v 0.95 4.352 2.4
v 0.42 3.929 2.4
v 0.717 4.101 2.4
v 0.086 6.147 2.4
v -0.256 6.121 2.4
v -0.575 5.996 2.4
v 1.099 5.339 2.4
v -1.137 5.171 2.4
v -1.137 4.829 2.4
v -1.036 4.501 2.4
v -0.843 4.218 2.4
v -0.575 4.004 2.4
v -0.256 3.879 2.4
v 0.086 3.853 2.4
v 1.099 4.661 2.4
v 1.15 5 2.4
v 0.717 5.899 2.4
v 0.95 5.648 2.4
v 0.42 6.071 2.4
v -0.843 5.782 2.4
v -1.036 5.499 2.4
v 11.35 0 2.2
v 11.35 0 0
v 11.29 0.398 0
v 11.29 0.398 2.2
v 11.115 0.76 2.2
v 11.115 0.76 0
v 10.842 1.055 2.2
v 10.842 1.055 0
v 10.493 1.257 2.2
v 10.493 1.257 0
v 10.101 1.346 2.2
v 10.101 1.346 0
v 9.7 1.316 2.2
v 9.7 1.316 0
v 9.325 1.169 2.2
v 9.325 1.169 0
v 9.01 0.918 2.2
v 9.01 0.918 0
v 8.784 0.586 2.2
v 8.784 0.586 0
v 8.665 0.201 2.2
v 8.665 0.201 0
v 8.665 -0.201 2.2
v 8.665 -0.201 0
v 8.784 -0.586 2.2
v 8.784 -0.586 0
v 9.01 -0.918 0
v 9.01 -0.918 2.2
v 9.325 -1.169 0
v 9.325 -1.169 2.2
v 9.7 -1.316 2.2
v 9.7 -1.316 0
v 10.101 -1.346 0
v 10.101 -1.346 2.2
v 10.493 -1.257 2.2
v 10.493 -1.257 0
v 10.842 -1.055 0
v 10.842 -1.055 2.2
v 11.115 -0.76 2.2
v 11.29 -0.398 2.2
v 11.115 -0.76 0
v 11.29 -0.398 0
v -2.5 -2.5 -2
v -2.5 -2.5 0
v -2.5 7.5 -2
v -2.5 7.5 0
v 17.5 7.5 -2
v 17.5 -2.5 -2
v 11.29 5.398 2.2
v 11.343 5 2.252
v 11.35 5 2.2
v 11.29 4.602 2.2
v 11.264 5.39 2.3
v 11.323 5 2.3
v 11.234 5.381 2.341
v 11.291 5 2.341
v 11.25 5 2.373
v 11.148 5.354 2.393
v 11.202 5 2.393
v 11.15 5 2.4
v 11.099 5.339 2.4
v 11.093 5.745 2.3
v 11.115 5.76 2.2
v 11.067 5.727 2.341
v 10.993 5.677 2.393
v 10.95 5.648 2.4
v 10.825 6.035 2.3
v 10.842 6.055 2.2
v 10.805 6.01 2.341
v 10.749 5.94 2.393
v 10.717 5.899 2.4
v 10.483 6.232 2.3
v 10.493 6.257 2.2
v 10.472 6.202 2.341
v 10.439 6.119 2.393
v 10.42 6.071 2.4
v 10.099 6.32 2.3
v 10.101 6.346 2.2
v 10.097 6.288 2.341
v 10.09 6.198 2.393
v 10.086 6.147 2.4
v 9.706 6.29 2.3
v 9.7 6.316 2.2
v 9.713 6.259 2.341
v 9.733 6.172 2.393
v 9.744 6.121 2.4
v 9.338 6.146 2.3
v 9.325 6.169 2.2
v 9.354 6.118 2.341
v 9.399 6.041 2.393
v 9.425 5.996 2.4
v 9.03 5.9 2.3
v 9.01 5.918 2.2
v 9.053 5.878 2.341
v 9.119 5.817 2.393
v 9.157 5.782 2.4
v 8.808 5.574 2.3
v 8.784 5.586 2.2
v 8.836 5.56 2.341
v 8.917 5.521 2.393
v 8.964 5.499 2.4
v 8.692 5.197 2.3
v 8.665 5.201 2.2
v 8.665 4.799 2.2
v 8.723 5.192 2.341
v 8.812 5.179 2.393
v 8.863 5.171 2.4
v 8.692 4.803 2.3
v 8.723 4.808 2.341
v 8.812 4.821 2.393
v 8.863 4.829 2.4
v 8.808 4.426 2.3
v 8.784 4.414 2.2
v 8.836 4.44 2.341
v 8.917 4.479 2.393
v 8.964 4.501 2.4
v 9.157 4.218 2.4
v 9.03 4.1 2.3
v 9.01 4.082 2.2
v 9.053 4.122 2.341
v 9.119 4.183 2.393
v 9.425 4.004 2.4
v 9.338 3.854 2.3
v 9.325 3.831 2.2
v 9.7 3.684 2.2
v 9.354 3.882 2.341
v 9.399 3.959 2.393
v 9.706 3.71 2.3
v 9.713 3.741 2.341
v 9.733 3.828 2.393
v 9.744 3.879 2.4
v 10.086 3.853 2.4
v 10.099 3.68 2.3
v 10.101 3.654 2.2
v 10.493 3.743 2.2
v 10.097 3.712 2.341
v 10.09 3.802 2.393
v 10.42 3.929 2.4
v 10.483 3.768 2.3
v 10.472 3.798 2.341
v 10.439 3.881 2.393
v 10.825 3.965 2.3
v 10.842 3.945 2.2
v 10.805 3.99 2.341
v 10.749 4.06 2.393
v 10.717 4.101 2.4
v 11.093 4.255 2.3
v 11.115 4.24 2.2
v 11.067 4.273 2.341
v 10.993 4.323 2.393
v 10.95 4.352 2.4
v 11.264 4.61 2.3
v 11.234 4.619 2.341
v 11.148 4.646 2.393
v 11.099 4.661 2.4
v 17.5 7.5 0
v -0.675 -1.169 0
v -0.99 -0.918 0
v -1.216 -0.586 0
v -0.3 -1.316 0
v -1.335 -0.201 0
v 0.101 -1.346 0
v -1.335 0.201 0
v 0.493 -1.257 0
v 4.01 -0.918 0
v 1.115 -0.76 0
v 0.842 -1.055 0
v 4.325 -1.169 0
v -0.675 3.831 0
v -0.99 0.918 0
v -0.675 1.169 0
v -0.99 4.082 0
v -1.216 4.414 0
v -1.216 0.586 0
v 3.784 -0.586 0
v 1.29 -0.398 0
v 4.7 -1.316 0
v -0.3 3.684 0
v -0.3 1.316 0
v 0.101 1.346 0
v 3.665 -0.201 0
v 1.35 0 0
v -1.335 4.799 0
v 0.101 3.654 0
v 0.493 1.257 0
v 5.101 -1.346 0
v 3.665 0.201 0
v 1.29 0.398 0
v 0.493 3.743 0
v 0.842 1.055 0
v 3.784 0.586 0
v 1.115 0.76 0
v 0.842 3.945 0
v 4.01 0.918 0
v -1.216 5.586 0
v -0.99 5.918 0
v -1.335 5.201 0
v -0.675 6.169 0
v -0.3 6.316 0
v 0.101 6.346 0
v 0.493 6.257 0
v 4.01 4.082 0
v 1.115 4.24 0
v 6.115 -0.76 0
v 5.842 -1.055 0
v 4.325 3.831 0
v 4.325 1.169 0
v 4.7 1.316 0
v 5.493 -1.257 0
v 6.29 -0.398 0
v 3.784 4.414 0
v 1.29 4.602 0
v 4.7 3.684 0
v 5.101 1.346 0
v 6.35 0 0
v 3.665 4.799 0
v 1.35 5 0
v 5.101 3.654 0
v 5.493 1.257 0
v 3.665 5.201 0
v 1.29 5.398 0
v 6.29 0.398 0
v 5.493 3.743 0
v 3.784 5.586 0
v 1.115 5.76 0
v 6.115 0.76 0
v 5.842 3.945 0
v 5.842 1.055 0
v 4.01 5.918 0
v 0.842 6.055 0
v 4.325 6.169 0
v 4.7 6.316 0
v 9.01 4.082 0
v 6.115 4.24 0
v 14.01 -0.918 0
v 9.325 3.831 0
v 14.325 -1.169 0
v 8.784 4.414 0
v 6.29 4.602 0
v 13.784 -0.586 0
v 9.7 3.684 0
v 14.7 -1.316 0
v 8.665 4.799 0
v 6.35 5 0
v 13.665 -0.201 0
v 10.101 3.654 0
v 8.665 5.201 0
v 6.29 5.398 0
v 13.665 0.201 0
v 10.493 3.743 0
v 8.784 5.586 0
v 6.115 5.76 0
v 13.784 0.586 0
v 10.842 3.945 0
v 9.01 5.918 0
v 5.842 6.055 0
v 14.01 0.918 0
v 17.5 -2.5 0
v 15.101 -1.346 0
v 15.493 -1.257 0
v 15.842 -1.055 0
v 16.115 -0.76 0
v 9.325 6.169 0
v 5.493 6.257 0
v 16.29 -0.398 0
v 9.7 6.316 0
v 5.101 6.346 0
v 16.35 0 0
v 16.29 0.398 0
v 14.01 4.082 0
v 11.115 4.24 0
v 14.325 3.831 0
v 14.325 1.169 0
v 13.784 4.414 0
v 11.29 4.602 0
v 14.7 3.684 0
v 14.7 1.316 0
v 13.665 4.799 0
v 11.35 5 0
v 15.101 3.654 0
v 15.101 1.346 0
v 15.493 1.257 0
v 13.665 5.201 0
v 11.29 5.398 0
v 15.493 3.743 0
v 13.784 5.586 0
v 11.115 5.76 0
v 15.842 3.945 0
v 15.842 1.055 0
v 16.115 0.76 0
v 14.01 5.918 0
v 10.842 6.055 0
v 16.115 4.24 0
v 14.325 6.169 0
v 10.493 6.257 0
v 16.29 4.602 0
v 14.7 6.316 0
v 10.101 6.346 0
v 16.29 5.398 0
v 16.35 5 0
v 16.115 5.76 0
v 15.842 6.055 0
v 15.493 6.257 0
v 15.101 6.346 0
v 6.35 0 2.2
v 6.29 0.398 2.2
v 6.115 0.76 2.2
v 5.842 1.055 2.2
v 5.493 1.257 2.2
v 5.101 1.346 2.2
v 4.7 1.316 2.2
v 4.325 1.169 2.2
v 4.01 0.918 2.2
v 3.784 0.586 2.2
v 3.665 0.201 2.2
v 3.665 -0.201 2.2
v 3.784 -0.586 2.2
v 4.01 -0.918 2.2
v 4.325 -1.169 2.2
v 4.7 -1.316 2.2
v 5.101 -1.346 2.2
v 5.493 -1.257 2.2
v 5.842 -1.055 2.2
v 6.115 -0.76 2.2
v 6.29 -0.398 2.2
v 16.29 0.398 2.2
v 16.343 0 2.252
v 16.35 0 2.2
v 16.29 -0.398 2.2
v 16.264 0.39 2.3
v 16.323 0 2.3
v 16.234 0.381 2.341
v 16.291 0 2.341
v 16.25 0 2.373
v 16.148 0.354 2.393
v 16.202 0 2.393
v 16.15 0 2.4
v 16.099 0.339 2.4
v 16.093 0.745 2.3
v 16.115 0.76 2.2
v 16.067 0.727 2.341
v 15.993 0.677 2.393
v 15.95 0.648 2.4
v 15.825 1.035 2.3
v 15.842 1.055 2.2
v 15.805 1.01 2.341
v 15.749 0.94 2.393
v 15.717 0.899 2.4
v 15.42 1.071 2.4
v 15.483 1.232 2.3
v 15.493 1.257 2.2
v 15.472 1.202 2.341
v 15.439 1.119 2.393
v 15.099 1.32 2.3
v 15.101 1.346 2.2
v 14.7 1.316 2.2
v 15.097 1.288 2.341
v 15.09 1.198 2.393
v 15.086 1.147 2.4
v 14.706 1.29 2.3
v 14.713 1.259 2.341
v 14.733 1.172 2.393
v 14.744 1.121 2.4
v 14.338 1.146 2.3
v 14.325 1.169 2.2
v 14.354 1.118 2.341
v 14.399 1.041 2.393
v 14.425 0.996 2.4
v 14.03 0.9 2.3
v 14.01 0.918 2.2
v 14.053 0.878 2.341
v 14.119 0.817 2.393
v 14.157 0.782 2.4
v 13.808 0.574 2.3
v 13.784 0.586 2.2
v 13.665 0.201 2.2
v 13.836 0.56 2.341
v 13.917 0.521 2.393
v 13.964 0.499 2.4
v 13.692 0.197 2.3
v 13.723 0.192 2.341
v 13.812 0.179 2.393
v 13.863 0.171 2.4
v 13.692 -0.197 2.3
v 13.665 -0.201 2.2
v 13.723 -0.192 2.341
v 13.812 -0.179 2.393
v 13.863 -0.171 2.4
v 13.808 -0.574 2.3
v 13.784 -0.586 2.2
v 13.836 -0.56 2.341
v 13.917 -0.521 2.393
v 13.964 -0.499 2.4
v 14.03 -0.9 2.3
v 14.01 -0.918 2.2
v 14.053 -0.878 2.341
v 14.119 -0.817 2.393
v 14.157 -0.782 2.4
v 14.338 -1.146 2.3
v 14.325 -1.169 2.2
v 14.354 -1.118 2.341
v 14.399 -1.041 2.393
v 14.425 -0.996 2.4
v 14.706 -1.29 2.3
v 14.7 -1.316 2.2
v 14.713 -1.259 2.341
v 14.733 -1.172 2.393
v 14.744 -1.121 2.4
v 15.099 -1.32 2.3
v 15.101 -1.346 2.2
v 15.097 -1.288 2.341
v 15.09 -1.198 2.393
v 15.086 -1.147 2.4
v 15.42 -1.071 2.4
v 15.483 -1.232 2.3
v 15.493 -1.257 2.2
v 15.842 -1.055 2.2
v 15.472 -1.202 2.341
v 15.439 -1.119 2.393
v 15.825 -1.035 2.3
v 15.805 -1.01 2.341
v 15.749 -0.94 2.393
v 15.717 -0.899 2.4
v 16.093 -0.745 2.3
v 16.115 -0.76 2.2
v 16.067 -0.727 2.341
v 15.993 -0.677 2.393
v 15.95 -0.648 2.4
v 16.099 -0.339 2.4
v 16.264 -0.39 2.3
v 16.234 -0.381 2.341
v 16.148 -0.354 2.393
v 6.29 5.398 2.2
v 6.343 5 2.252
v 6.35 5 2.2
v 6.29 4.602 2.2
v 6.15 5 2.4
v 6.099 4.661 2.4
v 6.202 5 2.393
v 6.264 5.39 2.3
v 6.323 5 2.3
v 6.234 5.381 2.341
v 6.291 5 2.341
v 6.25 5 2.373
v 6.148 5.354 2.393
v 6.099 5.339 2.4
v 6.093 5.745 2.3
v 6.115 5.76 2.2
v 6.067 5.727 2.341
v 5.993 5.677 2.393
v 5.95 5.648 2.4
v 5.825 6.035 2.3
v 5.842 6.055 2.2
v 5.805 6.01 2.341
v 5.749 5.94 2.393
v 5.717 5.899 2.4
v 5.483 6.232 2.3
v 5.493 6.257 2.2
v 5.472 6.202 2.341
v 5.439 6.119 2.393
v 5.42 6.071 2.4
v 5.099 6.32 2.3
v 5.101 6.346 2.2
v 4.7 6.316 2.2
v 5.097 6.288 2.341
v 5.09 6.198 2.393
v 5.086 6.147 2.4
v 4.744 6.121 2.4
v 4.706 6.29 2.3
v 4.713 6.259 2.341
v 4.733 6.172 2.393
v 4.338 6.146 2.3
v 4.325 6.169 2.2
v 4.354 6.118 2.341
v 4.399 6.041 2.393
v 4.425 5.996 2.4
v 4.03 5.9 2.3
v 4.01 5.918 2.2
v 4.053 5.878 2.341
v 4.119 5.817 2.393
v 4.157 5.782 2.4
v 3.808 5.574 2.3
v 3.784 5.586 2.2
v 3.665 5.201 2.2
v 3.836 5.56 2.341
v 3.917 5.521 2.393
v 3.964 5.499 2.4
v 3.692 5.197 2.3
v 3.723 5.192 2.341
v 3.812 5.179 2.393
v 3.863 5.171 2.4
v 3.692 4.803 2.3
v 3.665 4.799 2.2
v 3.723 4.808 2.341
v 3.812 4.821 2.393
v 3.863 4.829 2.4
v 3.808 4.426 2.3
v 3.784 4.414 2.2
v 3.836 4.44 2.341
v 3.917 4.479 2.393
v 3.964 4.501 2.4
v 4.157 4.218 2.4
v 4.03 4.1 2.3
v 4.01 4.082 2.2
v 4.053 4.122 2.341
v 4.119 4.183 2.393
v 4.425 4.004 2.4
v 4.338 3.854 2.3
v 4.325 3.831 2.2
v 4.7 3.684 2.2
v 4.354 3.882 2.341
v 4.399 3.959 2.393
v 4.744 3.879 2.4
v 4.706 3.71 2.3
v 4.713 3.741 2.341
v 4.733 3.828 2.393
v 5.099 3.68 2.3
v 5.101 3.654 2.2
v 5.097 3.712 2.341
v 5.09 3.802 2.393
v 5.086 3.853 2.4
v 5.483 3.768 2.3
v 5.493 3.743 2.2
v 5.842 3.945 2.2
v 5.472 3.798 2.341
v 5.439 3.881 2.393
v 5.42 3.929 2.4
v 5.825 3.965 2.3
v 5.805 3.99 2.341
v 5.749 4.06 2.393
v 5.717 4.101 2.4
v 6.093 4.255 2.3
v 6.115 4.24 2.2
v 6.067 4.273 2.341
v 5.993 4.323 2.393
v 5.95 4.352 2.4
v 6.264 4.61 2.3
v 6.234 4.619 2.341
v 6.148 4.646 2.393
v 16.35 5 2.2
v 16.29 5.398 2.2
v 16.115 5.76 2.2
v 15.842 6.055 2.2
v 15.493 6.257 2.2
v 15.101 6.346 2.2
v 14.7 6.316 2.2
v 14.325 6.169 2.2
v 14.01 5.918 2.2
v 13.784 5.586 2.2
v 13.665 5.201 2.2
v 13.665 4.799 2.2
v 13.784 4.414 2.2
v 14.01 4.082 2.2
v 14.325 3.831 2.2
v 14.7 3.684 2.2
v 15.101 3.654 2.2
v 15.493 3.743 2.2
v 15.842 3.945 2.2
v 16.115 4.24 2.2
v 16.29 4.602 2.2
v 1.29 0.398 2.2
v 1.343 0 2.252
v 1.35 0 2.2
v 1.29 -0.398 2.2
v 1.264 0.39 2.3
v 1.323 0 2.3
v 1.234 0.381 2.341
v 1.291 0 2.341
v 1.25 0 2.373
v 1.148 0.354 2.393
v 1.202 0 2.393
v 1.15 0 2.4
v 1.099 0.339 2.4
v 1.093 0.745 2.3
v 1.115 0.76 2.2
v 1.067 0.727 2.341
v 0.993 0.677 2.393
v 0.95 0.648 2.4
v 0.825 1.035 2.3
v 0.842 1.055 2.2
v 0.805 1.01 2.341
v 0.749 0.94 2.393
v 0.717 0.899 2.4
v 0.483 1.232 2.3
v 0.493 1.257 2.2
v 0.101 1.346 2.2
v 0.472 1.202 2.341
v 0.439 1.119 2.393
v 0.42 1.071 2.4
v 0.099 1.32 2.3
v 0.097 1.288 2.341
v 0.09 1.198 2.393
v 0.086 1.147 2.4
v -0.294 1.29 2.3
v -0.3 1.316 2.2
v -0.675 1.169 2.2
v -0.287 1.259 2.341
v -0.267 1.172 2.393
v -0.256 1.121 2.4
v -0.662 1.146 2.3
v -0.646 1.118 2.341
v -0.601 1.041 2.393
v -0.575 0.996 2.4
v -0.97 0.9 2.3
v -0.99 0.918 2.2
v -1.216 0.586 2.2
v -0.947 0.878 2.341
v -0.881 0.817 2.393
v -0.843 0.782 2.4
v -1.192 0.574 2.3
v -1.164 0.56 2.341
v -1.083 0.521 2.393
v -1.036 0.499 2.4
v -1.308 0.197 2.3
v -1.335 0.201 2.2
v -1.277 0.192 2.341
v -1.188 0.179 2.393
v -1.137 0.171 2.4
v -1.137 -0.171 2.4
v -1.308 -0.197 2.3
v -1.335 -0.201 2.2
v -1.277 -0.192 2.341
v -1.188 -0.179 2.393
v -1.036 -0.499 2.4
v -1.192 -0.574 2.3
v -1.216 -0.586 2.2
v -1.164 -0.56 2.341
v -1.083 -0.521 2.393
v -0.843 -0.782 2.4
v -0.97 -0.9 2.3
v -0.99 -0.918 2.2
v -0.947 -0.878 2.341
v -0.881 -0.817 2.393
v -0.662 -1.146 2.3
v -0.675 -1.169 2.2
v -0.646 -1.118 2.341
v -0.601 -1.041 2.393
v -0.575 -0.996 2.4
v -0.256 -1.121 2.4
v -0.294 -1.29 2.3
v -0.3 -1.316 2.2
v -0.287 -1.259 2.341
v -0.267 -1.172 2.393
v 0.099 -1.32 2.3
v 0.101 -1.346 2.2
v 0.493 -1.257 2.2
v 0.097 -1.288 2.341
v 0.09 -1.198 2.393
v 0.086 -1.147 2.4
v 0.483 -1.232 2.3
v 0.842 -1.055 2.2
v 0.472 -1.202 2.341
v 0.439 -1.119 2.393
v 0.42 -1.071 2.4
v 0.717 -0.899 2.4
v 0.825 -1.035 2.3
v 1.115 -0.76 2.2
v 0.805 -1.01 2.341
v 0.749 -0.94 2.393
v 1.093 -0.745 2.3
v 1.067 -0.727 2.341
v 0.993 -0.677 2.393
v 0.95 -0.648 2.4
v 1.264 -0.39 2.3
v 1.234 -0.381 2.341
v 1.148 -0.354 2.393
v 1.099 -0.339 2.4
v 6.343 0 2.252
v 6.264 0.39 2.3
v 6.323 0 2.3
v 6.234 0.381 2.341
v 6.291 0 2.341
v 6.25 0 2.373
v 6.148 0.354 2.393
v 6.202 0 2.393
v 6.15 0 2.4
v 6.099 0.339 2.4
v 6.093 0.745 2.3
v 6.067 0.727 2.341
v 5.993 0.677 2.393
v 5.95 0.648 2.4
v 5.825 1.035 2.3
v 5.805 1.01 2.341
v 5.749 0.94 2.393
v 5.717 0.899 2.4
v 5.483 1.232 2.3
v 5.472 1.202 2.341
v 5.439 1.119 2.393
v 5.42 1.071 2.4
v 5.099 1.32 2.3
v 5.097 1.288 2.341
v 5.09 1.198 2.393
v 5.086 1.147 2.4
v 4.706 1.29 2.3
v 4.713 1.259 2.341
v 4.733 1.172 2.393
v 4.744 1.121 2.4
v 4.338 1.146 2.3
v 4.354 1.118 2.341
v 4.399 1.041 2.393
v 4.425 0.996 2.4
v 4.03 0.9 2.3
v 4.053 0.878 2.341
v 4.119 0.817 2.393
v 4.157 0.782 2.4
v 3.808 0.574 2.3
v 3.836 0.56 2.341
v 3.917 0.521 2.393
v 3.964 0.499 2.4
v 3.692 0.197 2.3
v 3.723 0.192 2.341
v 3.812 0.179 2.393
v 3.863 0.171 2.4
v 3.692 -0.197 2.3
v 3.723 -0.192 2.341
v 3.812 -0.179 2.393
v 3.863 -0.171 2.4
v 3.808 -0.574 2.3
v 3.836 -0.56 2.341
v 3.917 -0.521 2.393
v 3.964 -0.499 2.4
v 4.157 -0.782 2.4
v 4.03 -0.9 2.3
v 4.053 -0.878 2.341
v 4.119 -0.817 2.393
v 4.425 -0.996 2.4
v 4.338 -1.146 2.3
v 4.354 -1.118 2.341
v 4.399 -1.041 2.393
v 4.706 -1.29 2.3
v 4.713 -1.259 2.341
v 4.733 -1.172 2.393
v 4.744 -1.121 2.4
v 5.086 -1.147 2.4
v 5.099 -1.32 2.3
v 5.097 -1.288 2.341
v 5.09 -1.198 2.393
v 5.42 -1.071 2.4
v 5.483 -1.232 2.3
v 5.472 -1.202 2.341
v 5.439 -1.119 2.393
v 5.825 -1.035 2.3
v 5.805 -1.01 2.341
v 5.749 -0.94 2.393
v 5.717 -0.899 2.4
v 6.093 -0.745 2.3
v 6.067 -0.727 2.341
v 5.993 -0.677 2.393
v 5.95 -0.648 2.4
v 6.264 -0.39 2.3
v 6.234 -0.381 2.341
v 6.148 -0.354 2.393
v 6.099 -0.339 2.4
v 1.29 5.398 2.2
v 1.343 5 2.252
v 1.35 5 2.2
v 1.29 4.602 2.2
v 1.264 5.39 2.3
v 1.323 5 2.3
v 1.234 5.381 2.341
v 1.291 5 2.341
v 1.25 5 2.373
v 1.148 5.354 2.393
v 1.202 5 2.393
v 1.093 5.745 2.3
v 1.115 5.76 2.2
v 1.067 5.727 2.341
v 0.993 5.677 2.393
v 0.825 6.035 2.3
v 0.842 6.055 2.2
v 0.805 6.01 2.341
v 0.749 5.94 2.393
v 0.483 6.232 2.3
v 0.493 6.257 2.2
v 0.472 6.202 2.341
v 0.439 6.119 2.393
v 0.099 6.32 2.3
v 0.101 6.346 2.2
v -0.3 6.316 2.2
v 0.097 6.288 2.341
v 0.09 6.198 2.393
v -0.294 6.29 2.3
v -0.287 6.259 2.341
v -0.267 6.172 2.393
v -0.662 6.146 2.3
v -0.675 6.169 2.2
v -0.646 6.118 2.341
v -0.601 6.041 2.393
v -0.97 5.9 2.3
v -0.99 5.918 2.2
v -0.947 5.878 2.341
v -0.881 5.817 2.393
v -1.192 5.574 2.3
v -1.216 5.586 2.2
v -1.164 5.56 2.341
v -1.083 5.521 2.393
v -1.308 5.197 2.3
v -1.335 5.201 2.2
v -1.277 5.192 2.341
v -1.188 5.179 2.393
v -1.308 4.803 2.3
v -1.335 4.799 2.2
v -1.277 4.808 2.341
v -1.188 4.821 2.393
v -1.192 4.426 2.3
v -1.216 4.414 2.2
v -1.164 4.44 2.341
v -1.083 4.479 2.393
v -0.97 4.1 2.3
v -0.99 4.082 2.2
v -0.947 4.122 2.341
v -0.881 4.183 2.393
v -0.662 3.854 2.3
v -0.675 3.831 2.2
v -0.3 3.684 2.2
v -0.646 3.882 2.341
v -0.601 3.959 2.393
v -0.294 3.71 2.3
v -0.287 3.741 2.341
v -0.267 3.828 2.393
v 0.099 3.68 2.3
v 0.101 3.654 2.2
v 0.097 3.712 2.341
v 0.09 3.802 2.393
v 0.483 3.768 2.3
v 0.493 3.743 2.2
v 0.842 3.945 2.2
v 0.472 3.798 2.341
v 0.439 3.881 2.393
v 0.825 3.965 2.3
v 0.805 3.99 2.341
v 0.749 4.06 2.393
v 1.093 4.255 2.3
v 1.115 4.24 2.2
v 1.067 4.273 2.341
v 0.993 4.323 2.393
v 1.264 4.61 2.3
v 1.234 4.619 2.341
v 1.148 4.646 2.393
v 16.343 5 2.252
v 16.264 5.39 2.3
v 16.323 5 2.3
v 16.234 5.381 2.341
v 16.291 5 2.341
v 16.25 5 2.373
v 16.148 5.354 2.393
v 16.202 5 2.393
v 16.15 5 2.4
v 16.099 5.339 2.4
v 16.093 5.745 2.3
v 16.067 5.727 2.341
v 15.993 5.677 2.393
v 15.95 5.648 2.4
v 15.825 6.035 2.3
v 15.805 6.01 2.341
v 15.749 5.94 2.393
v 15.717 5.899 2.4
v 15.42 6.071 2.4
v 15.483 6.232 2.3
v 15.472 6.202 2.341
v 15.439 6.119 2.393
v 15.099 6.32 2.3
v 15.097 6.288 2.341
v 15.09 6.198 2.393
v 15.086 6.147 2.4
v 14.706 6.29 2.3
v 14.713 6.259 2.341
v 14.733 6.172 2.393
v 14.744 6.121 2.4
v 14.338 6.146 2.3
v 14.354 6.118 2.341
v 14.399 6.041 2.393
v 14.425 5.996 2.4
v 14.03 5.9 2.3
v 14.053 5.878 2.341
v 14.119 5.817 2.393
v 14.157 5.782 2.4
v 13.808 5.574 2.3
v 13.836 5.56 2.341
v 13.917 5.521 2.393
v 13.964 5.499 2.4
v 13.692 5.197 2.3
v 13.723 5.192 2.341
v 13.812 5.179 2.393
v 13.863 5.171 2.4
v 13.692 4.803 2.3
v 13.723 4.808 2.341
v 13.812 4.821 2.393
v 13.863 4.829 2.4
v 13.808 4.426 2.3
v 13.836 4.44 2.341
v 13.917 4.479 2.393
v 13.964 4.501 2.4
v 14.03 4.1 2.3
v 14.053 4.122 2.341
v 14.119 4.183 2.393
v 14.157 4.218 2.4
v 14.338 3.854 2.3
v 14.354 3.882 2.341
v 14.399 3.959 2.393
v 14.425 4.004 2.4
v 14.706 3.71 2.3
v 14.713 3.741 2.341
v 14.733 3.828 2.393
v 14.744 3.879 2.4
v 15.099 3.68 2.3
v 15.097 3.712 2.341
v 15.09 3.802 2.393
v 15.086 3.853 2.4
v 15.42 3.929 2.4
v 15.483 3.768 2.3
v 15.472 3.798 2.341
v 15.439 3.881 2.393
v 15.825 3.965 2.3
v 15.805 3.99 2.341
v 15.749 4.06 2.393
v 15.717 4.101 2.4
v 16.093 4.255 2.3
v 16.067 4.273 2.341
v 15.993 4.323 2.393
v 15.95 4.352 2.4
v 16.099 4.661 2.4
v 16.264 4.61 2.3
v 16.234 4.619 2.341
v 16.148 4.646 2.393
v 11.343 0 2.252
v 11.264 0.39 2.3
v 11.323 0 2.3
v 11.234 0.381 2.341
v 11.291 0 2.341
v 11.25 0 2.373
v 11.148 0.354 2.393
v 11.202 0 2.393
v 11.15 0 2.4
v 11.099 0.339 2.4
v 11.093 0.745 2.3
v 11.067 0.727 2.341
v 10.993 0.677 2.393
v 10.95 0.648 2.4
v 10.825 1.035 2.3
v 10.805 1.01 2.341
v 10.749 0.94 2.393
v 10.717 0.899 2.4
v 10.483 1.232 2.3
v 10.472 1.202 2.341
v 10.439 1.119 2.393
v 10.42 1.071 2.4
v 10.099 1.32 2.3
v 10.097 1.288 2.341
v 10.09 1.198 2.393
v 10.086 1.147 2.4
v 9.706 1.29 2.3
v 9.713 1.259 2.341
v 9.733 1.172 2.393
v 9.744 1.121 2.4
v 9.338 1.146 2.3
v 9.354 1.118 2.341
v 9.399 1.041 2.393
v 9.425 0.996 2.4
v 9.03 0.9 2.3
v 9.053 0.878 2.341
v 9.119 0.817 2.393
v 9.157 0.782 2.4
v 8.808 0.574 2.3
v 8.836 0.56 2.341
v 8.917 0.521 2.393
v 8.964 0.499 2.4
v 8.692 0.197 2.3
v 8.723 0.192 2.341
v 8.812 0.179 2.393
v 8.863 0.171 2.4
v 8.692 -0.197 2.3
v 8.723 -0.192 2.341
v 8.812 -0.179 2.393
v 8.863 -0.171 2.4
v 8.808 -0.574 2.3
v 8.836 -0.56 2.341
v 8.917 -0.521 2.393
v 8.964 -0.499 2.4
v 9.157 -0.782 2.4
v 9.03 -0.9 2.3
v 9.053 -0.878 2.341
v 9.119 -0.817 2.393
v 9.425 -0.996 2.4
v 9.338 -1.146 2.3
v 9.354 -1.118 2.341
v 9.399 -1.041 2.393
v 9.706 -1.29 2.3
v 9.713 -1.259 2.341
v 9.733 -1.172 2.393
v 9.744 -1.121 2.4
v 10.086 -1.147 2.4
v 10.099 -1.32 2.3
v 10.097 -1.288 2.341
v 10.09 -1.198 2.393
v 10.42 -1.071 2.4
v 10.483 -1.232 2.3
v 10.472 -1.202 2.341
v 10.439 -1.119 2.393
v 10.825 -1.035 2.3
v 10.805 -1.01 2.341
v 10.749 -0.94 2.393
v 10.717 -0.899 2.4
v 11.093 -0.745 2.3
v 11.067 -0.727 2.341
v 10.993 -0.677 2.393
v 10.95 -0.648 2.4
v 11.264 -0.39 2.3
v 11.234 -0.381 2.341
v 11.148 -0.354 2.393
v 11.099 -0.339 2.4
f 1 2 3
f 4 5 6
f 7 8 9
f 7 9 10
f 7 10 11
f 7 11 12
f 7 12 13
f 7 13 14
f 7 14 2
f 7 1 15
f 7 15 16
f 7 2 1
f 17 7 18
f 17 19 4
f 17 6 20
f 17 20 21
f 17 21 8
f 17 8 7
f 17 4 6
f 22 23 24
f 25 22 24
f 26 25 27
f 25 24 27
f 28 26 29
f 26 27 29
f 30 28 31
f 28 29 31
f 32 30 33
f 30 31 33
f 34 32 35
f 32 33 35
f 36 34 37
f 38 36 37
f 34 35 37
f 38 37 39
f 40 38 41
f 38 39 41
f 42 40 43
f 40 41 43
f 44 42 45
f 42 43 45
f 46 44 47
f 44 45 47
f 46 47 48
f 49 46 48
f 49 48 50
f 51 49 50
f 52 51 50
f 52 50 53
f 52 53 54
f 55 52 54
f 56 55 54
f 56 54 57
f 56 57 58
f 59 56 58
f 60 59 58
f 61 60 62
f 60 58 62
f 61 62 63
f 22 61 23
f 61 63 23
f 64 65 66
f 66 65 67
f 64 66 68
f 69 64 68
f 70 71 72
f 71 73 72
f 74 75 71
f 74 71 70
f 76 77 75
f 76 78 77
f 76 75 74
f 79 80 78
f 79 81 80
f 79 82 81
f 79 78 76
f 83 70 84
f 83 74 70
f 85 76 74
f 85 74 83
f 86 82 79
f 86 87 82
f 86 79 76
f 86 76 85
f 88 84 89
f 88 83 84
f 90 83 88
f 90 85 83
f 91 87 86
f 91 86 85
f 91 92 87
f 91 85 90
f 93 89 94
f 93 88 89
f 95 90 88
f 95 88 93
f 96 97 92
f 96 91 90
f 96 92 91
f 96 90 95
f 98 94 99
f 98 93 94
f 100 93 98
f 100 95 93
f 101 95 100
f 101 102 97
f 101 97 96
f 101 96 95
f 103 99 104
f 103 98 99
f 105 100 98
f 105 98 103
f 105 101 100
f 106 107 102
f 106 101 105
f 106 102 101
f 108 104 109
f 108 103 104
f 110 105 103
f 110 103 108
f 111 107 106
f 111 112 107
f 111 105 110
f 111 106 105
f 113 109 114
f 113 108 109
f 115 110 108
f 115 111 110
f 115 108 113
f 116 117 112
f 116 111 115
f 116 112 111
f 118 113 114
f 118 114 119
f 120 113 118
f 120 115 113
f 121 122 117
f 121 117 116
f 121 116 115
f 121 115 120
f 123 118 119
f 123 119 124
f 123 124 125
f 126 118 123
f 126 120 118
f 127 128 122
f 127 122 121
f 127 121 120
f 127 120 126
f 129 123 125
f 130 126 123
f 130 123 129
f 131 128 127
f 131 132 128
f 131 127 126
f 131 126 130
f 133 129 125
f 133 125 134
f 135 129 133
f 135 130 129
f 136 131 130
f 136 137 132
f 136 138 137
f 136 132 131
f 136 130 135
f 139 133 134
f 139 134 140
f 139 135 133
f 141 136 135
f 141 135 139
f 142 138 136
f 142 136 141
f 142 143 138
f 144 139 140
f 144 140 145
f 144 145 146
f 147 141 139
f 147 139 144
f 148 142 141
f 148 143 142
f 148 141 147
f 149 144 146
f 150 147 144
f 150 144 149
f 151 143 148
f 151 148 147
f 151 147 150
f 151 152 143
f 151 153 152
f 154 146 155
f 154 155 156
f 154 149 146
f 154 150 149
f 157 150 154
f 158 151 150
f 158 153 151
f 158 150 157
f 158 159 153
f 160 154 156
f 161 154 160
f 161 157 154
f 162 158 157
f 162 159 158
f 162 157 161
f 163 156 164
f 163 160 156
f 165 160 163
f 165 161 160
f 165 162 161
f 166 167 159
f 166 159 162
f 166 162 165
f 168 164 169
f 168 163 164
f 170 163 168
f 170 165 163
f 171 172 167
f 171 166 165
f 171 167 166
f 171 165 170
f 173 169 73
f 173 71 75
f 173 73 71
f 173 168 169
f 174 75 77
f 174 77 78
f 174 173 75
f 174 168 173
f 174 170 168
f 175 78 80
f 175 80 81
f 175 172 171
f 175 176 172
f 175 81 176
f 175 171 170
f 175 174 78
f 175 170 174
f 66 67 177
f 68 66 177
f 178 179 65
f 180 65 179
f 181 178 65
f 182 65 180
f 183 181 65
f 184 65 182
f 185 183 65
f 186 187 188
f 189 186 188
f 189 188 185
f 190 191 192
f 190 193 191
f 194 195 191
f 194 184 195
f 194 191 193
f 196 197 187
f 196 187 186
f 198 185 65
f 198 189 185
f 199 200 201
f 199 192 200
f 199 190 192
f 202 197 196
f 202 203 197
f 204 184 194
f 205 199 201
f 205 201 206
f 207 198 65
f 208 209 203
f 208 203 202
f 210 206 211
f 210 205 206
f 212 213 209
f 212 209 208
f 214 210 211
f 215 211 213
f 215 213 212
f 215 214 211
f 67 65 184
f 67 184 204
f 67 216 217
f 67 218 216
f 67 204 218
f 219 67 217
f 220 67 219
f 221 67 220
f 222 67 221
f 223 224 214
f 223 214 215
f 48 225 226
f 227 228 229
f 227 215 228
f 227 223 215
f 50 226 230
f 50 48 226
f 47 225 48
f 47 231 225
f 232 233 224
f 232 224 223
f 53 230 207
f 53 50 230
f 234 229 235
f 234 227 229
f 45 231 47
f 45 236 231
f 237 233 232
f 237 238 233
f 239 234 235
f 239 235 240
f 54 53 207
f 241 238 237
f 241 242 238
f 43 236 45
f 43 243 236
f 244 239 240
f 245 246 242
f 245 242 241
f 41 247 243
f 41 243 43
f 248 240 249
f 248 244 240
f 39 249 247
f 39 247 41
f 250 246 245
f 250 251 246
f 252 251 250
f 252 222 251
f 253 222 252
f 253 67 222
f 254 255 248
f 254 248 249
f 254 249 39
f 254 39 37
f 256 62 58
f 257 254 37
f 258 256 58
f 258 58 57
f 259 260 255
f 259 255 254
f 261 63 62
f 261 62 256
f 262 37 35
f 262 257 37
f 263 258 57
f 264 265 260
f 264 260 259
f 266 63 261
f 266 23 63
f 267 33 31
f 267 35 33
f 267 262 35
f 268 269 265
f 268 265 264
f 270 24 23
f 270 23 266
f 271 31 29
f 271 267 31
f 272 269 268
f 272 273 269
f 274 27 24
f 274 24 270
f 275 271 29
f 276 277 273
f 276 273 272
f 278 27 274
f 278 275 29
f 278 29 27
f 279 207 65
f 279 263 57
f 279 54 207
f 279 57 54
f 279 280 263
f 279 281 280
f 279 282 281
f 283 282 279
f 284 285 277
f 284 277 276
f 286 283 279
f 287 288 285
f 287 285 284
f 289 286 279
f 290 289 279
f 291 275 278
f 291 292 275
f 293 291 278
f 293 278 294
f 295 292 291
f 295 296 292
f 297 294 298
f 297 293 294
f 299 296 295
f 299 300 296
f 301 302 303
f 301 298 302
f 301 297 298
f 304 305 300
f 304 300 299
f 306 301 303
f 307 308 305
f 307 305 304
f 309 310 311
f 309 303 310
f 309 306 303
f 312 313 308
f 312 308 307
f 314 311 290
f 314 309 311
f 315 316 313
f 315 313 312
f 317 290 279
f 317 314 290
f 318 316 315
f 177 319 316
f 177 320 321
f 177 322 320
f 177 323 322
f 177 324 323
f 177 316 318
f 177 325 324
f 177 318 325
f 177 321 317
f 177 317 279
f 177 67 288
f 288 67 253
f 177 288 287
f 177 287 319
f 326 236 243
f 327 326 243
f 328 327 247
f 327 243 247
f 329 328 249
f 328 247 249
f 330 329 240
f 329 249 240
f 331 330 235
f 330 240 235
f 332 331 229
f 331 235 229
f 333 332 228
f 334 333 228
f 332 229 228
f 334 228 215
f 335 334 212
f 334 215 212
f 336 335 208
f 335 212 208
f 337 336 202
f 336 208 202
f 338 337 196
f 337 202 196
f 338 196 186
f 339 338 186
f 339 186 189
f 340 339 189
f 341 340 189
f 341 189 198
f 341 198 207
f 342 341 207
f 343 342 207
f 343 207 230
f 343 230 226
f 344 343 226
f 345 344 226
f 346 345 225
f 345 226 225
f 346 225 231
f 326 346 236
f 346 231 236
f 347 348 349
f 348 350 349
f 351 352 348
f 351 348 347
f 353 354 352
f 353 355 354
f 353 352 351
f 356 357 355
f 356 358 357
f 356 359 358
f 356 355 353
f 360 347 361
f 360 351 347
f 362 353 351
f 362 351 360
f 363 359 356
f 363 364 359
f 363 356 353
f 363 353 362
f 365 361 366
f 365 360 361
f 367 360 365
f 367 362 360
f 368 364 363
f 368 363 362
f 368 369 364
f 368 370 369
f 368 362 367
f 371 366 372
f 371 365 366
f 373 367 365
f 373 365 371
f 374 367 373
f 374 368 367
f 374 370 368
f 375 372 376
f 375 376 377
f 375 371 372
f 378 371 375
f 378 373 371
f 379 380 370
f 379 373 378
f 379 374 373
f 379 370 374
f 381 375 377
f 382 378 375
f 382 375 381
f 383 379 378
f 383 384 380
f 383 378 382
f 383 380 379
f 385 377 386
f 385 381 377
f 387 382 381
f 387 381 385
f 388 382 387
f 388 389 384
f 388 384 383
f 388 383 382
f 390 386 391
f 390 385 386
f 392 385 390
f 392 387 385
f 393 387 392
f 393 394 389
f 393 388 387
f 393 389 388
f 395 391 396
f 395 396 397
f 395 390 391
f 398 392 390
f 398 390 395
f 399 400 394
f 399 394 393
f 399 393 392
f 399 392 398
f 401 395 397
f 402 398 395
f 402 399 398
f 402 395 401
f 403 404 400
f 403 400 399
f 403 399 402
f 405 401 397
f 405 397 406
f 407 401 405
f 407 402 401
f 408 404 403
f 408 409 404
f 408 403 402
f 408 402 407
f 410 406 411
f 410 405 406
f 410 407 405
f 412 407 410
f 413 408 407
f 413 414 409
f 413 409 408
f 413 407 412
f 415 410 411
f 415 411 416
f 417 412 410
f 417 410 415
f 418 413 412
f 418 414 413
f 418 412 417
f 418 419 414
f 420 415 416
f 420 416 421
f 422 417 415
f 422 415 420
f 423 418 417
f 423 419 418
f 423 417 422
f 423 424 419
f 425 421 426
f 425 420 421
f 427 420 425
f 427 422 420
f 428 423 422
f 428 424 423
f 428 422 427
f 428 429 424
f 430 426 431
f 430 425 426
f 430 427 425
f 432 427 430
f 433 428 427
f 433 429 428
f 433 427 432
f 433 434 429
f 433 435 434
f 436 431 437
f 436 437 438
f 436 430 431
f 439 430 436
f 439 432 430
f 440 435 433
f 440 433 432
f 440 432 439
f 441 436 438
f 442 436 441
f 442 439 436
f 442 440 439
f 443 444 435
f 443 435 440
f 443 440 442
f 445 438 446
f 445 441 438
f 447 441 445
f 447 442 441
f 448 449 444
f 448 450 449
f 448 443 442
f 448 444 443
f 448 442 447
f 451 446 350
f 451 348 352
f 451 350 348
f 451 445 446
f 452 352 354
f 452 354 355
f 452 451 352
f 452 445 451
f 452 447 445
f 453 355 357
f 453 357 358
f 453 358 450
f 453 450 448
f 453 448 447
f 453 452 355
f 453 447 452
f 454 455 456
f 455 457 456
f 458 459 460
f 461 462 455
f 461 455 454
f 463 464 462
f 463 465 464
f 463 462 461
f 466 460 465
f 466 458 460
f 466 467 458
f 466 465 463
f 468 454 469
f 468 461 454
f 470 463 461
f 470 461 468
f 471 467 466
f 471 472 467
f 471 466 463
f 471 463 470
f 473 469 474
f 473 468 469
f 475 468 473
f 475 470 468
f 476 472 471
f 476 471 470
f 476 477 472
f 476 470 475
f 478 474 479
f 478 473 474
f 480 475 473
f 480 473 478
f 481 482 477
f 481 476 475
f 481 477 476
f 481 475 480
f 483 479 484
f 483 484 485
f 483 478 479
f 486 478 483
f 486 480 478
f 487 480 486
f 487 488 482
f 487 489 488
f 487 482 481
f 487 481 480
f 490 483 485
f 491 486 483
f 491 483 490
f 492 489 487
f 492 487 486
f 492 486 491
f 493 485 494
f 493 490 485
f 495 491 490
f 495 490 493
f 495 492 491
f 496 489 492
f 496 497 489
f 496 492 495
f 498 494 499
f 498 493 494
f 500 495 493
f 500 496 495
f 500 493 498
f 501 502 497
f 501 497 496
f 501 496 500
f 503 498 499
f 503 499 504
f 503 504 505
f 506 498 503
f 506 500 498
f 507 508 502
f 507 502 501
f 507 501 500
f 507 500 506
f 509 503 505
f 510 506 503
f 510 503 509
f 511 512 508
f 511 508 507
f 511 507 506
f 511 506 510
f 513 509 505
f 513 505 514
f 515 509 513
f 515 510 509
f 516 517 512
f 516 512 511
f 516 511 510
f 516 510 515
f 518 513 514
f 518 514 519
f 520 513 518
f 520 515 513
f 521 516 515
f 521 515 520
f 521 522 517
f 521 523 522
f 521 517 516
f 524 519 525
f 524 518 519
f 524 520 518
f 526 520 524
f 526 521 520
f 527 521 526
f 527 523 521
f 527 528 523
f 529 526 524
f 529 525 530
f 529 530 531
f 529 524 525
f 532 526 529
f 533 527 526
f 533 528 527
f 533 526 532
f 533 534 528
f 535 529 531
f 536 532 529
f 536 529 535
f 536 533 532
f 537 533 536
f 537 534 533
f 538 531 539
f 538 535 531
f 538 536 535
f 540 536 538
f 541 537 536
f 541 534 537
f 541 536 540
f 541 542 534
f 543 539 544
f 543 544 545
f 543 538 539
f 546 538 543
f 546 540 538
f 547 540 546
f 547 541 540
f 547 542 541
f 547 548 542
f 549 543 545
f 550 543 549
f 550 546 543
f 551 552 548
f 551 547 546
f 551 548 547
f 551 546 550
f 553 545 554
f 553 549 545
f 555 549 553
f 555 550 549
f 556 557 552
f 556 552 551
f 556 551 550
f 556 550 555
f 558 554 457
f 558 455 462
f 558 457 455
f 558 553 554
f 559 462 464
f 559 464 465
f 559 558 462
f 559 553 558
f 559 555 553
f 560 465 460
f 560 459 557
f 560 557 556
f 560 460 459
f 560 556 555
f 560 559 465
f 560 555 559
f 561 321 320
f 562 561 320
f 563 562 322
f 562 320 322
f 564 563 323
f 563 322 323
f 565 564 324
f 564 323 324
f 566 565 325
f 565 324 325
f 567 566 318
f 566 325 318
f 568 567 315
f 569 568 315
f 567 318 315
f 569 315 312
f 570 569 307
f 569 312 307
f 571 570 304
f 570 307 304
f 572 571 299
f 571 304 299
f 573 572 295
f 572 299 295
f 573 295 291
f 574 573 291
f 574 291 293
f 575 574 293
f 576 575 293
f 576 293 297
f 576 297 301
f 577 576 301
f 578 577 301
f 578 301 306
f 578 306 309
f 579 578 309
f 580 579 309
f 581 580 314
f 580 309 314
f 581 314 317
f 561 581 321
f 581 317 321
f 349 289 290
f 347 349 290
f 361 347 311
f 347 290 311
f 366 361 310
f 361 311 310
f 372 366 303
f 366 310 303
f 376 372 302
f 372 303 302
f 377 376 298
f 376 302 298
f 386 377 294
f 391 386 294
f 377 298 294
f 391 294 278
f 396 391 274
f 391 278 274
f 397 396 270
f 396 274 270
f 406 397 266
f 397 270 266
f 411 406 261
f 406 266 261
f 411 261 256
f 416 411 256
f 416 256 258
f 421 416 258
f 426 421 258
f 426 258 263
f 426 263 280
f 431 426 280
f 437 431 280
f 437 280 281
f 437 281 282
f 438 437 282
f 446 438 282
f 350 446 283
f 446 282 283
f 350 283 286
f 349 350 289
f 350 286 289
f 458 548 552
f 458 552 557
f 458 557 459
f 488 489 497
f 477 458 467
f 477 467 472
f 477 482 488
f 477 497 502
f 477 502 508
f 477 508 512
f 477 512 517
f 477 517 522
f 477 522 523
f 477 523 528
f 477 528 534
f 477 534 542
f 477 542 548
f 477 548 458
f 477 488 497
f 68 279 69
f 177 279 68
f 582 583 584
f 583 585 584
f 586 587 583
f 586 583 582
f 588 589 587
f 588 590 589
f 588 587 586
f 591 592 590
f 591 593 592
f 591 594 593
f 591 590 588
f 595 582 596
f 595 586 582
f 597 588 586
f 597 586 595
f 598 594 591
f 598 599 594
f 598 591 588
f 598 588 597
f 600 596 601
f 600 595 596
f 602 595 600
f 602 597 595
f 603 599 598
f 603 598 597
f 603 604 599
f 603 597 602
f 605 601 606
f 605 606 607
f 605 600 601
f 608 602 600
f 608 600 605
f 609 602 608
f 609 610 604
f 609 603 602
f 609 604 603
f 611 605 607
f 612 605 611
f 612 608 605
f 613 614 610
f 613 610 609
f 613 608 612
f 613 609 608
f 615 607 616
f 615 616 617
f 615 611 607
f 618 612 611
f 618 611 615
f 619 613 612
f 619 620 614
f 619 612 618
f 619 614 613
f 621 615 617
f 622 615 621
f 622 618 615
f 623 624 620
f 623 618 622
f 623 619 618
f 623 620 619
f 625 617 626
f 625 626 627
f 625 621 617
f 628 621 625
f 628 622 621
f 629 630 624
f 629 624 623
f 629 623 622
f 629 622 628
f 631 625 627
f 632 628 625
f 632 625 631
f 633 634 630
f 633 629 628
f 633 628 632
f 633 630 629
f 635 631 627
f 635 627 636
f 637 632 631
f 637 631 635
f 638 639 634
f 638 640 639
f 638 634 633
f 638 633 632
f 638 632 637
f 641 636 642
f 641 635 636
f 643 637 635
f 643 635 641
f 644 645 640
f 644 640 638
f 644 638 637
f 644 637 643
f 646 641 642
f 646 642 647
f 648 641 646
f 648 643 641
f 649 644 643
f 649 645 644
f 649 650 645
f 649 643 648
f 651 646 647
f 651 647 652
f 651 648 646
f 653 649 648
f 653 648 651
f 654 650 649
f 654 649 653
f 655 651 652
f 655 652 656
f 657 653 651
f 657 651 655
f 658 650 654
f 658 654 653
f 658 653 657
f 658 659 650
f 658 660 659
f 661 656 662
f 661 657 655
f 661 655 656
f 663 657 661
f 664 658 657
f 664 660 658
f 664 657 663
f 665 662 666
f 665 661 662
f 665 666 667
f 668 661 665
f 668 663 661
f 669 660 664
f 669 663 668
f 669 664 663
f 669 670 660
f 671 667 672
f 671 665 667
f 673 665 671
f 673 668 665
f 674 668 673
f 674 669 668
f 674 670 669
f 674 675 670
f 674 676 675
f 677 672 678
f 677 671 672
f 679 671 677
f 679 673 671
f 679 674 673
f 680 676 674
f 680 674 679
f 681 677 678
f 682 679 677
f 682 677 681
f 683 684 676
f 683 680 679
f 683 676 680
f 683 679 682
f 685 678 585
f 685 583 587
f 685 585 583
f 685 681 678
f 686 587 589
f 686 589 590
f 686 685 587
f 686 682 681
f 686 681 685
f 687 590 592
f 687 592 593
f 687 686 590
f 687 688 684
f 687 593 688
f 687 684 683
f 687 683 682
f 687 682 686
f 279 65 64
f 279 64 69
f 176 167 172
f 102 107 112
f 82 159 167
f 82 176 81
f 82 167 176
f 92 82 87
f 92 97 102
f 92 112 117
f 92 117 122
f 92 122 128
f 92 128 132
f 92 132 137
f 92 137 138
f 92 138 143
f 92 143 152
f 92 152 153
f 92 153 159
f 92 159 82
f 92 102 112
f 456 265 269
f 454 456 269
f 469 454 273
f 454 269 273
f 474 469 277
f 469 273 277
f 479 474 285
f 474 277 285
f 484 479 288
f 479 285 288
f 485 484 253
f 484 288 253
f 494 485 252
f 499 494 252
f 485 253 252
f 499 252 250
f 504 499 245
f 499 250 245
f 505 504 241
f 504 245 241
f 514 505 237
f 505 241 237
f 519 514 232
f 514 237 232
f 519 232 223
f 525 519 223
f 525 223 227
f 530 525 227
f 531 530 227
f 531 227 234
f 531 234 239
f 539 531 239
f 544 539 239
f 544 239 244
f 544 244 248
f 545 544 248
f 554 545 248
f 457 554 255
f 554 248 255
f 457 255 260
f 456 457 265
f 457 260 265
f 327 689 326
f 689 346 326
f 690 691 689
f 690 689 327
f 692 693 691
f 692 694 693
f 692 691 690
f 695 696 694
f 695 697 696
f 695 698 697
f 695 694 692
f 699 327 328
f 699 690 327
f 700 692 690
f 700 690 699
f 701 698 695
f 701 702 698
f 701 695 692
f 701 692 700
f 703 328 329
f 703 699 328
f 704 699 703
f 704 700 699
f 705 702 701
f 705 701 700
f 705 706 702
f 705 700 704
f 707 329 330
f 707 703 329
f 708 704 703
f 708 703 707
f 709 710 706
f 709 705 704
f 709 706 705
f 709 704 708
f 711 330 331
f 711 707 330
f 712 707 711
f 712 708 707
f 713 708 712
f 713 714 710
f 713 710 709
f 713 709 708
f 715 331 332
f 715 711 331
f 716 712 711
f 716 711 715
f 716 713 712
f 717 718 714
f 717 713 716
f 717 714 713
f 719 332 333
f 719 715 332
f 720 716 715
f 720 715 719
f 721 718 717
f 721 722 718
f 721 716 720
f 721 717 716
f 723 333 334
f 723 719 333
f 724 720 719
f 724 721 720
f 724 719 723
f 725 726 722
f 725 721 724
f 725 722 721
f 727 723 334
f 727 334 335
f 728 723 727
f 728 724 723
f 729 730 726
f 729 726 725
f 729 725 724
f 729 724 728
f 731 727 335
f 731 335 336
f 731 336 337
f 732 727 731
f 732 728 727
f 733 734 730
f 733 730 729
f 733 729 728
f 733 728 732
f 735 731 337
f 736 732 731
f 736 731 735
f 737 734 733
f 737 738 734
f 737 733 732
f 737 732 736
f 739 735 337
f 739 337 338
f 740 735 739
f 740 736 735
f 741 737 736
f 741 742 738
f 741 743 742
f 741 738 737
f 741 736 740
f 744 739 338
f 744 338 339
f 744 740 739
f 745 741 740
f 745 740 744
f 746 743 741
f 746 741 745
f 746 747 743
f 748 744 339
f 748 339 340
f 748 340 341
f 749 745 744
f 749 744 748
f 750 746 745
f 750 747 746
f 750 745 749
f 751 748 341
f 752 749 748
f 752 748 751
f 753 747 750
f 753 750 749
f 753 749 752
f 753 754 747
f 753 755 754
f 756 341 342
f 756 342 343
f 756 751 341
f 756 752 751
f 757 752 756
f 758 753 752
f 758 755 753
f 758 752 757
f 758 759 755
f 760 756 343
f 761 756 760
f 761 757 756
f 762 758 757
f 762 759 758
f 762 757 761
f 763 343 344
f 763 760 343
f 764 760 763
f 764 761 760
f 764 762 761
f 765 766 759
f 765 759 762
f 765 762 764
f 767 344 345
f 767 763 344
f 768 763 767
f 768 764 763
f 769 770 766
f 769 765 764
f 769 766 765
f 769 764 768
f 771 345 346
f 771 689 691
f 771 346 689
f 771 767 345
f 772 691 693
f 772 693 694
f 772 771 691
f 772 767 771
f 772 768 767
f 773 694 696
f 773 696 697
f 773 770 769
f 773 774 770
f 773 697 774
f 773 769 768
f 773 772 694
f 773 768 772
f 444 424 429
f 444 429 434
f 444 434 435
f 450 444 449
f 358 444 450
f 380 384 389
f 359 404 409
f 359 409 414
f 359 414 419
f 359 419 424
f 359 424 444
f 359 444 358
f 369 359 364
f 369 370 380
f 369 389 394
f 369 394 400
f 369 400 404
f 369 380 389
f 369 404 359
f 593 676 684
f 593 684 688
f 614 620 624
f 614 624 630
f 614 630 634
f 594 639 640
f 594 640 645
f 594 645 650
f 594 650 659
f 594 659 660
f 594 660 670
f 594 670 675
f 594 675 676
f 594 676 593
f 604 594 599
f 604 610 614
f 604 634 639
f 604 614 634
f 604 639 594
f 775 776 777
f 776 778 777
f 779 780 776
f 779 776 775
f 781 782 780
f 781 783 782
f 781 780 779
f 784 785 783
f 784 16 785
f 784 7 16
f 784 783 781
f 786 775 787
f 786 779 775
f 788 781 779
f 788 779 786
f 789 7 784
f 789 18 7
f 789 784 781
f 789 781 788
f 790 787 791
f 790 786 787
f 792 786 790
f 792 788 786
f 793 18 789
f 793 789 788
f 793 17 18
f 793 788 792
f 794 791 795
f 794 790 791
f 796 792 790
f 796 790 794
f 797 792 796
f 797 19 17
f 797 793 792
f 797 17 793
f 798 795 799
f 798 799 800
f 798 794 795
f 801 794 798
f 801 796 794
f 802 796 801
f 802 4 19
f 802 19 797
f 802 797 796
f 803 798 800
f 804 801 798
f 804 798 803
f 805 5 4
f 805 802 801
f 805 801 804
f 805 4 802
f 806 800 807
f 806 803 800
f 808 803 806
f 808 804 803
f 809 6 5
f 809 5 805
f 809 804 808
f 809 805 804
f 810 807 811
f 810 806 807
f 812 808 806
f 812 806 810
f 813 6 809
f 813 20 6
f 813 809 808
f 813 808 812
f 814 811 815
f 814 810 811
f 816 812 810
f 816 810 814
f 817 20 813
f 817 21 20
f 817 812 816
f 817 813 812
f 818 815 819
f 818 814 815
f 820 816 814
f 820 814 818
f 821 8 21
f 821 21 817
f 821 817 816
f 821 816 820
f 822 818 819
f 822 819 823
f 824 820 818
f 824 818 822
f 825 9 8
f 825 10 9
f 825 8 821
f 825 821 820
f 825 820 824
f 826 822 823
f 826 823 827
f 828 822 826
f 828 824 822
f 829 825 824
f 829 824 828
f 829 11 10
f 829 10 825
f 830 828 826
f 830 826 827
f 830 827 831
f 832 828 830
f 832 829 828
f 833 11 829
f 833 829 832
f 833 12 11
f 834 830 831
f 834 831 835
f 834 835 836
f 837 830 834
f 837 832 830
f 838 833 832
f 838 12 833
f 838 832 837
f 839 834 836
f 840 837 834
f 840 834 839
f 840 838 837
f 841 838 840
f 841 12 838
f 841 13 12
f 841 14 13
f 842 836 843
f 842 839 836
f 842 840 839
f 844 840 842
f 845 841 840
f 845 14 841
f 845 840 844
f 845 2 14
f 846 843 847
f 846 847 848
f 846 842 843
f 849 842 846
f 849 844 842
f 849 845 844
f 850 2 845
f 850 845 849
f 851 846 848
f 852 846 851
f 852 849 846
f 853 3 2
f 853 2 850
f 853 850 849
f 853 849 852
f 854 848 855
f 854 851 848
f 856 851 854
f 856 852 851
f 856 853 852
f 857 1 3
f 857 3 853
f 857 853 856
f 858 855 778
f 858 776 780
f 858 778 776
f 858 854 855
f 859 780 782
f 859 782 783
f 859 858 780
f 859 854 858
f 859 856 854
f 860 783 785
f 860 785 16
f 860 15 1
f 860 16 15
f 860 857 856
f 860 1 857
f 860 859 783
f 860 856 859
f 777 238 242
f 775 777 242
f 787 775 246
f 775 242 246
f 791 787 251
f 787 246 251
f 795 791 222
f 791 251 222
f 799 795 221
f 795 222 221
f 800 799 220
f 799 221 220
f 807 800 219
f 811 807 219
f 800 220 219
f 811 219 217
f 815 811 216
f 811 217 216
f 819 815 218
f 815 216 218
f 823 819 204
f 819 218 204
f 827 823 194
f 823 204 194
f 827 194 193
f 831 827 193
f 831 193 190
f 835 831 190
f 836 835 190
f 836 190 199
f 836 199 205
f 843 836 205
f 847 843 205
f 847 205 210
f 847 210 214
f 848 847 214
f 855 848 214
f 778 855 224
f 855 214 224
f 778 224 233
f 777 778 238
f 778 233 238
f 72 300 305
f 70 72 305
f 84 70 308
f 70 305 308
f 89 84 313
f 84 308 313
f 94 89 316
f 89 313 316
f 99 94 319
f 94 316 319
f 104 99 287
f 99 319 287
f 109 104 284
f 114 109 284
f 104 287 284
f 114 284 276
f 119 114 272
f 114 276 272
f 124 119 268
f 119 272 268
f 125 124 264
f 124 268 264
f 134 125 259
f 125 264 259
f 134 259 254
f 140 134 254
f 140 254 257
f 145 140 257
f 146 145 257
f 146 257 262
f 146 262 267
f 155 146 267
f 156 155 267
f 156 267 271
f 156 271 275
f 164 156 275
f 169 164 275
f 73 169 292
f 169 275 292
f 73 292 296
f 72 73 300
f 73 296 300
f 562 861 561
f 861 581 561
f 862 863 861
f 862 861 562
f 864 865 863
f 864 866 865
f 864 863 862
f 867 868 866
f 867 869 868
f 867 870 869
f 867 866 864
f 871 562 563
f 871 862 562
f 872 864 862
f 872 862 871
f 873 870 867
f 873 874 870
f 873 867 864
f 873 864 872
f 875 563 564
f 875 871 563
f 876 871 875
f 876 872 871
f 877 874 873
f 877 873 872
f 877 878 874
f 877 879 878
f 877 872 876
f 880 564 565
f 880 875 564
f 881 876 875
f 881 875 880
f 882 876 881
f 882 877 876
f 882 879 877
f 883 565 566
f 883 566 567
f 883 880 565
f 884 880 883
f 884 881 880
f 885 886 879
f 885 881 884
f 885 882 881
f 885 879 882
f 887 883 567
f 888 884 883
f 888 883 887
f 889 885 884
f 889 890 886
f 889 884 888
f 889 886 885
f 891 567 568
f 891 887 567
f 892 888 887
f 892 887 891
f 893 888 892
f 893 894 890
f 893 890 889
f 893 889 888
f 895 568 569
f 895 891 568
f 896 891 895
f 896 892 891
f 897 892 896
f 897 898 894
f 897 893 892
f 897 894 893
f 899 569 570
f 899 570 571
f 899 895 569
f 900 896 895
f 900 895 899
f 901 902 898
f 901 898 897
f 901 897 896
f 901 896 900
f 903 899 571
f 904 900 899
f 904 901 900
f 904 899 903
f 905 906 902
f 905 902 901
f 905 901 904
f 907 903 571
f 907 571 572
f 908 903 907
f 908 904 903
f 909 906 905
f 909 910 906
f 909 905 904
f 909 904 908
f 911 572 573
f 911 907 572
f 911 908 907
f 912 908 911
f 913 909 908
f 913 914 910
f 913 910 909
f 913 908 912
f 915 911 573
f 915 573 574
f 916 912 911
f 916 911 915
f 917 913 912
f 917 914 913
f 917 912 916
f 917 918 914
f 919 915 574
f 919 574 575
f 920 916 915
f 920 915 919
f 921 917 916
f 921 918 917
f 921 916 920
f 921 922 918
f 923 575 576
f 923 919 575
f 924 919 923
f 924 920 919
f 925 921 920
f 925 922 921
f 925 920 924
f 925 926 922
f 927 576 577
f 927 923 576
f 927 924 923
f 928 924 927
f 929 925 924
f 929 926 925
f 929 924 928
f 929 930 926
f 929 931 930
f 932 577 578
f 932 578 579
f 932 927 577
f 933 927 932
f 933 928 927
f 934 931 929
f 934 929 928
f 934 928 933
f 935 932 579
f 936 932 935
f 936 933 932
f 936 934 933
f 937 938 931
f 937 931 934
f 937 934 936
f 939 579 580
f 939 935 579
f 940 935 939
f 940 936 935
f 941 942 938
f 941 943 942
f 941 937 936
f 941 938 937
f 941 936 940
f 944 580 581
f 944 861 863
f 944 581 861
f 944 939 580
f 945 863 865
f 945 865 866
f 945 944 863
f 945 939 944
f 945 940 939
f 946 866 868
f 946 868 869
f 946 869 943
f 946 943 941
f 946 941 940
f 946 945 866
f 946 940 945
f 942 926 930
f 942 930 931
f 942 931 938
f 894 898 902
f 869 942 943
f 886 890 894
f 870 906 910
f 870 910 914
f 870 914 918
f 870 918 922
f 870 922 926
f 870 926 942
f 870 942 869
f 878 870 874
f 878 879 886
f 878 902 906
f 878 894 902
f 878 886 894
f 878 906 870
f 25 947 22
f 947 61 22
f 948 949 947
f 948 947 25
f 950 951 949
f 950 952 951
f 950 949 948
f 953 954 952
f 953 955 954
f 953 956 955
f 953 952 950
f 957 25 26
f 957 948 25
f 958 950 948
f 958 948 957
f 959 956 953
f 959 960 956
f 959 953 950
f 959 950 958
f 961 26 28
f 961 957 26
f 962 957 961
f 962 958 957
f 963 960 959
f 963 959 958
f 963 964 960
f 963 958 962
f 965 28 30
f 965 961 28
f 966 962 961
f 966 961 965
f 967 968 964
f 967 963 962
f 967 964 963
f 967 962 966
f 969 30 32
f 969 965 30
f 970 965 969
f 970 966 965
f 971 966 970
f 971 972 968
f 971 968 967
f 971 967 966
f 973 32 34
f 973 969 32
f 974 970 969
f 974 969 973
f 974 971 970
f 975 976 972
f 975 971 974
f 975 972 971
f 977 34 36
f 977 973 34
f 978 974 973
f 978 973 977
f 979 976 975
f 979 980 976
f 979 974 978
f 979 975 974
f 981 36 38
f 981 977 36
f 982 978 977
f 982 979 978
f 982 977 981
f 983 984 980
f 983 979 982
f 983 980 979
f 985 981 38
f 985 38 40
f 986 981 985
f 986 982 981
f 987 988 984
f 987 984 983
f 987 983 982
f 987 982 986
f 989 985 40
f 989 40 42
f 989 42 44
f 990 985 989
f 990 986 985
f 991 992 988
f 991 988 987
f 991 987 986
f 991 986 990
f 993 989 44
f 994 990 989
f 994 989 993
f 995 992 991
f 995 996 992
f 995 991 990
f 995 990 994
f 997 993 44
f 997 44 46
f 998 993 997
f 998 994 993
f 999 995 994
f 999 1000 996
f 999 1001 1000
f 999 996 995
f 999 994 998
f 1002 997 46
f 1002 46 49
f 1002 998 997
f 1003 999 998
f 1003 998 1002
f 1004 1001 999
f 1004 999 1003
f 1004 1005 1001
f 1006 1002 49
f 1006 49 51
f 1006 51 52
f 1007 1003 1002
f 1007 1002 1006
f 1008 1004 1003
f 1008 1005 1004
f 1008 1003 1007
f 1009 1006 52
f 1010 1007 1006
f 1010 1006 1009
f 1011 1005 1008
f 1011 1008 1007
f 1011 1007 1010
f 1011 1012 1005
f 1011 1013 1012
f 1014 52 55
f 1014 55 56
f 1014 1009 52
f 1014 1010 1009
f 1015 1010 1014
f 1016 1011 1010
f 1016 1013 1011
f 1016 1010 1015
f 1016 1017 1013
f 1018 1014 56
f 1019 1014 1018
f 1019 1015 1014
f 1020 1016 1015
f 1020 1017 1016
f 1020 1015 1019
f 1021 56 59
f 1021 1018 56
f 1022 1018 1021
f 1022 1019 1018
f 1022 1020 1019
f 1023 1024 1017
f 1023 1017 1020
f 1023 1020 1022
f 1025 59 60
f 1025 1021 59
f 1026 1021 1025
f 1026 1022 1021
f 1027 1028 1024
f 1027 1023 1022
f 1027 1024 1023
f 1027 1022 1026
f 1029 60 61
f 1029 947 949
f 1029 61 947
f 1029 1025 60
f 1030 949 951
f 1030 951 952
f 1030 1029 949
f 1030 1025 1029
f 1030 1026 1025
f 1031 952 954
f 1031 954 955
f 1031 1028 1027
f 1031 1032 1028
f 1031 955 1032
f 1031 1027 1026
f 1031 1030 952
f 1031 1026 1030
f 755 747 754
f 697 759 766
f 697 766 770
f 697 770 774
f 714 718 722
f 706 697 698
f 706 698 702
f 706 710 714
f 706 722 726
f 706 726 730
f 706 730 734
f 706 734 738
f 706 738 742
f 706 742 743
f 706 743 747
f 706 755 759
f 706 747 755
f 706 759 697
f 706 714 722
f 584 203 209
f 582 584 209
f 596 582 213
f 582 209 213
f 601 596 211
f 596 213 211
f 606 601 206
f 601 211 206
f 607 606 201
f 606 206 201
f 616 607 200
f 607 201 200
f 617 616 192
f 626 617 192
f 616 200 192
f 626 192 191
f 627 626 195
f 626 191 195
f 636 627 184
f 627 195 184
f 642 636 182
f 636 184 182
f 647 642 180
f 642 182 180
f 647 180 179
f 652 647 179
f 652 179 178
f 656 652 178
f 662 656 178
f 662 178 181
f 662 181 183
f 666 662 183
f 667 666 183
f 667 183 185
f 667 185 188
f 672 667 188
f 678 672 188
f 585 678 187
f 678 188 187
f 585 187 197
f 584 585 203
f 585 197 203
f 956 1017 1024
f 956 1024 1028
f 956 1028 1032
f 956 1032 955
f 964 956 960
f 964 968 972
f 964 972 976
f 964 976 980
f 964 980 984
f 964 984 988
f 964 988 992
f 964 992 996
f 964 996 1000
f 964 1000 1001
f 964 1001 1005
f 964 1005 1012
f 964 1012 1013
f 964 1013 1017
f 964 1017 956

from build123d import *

# Parameters (mm, degrees)
F0_R     = 1.35
F1_DEPTH = 2.4
F2_W     = 20
F2_H     = 10
F3_DEPTH = 2
F4_R     = 0.2


with BuildPart() as f1:
    # F0 (on Top) → F1 (new body)
    with BuildSketch(Plane.XY):
        Circle(F0_R)
        with Locations((0, 5)):
            Circle(F0_R)
        with Locations((5, 0)):
            Circle(F0_R)
        with Locations((5, 5)):
            Circle(F0_R)
        with Locations((10, 0)):
            Circle(F0_R)
        with Locations((10, 5)):
            Circle(F0_R)
        with Locations((15, 0)):
            Circle(F0_R)
        with Locations((15, 5)):
            Circle(F0_R)
    extrude(amount=F1_DEPTH)

    # F2 (on Top) → F3 (join)
    with BuildSketch(Plane.XY):
        with Locations((7.5, 2.5)):
            Rectangle(F2_W, F2_H)
    extrude(amount=-F3_DEPTH)

    # F4
    f4_edges = [f1.edges().sort_by_distance(p)[0] for p in [
        (-1.35, 5, 2.4),
        (3.65, 5, 2.4),
        (8.65, 5, 2.4),
        (13.65, 5, 2.4),
        (13.65, 0, 2.4),
        (8.65, 0, 2.4),
        (3.65, 0, 2.4),
        (-1.35, 0, 2.4),
    ]]
    fillet(f4_edges, radius=F4_R)


solid = f1.part
